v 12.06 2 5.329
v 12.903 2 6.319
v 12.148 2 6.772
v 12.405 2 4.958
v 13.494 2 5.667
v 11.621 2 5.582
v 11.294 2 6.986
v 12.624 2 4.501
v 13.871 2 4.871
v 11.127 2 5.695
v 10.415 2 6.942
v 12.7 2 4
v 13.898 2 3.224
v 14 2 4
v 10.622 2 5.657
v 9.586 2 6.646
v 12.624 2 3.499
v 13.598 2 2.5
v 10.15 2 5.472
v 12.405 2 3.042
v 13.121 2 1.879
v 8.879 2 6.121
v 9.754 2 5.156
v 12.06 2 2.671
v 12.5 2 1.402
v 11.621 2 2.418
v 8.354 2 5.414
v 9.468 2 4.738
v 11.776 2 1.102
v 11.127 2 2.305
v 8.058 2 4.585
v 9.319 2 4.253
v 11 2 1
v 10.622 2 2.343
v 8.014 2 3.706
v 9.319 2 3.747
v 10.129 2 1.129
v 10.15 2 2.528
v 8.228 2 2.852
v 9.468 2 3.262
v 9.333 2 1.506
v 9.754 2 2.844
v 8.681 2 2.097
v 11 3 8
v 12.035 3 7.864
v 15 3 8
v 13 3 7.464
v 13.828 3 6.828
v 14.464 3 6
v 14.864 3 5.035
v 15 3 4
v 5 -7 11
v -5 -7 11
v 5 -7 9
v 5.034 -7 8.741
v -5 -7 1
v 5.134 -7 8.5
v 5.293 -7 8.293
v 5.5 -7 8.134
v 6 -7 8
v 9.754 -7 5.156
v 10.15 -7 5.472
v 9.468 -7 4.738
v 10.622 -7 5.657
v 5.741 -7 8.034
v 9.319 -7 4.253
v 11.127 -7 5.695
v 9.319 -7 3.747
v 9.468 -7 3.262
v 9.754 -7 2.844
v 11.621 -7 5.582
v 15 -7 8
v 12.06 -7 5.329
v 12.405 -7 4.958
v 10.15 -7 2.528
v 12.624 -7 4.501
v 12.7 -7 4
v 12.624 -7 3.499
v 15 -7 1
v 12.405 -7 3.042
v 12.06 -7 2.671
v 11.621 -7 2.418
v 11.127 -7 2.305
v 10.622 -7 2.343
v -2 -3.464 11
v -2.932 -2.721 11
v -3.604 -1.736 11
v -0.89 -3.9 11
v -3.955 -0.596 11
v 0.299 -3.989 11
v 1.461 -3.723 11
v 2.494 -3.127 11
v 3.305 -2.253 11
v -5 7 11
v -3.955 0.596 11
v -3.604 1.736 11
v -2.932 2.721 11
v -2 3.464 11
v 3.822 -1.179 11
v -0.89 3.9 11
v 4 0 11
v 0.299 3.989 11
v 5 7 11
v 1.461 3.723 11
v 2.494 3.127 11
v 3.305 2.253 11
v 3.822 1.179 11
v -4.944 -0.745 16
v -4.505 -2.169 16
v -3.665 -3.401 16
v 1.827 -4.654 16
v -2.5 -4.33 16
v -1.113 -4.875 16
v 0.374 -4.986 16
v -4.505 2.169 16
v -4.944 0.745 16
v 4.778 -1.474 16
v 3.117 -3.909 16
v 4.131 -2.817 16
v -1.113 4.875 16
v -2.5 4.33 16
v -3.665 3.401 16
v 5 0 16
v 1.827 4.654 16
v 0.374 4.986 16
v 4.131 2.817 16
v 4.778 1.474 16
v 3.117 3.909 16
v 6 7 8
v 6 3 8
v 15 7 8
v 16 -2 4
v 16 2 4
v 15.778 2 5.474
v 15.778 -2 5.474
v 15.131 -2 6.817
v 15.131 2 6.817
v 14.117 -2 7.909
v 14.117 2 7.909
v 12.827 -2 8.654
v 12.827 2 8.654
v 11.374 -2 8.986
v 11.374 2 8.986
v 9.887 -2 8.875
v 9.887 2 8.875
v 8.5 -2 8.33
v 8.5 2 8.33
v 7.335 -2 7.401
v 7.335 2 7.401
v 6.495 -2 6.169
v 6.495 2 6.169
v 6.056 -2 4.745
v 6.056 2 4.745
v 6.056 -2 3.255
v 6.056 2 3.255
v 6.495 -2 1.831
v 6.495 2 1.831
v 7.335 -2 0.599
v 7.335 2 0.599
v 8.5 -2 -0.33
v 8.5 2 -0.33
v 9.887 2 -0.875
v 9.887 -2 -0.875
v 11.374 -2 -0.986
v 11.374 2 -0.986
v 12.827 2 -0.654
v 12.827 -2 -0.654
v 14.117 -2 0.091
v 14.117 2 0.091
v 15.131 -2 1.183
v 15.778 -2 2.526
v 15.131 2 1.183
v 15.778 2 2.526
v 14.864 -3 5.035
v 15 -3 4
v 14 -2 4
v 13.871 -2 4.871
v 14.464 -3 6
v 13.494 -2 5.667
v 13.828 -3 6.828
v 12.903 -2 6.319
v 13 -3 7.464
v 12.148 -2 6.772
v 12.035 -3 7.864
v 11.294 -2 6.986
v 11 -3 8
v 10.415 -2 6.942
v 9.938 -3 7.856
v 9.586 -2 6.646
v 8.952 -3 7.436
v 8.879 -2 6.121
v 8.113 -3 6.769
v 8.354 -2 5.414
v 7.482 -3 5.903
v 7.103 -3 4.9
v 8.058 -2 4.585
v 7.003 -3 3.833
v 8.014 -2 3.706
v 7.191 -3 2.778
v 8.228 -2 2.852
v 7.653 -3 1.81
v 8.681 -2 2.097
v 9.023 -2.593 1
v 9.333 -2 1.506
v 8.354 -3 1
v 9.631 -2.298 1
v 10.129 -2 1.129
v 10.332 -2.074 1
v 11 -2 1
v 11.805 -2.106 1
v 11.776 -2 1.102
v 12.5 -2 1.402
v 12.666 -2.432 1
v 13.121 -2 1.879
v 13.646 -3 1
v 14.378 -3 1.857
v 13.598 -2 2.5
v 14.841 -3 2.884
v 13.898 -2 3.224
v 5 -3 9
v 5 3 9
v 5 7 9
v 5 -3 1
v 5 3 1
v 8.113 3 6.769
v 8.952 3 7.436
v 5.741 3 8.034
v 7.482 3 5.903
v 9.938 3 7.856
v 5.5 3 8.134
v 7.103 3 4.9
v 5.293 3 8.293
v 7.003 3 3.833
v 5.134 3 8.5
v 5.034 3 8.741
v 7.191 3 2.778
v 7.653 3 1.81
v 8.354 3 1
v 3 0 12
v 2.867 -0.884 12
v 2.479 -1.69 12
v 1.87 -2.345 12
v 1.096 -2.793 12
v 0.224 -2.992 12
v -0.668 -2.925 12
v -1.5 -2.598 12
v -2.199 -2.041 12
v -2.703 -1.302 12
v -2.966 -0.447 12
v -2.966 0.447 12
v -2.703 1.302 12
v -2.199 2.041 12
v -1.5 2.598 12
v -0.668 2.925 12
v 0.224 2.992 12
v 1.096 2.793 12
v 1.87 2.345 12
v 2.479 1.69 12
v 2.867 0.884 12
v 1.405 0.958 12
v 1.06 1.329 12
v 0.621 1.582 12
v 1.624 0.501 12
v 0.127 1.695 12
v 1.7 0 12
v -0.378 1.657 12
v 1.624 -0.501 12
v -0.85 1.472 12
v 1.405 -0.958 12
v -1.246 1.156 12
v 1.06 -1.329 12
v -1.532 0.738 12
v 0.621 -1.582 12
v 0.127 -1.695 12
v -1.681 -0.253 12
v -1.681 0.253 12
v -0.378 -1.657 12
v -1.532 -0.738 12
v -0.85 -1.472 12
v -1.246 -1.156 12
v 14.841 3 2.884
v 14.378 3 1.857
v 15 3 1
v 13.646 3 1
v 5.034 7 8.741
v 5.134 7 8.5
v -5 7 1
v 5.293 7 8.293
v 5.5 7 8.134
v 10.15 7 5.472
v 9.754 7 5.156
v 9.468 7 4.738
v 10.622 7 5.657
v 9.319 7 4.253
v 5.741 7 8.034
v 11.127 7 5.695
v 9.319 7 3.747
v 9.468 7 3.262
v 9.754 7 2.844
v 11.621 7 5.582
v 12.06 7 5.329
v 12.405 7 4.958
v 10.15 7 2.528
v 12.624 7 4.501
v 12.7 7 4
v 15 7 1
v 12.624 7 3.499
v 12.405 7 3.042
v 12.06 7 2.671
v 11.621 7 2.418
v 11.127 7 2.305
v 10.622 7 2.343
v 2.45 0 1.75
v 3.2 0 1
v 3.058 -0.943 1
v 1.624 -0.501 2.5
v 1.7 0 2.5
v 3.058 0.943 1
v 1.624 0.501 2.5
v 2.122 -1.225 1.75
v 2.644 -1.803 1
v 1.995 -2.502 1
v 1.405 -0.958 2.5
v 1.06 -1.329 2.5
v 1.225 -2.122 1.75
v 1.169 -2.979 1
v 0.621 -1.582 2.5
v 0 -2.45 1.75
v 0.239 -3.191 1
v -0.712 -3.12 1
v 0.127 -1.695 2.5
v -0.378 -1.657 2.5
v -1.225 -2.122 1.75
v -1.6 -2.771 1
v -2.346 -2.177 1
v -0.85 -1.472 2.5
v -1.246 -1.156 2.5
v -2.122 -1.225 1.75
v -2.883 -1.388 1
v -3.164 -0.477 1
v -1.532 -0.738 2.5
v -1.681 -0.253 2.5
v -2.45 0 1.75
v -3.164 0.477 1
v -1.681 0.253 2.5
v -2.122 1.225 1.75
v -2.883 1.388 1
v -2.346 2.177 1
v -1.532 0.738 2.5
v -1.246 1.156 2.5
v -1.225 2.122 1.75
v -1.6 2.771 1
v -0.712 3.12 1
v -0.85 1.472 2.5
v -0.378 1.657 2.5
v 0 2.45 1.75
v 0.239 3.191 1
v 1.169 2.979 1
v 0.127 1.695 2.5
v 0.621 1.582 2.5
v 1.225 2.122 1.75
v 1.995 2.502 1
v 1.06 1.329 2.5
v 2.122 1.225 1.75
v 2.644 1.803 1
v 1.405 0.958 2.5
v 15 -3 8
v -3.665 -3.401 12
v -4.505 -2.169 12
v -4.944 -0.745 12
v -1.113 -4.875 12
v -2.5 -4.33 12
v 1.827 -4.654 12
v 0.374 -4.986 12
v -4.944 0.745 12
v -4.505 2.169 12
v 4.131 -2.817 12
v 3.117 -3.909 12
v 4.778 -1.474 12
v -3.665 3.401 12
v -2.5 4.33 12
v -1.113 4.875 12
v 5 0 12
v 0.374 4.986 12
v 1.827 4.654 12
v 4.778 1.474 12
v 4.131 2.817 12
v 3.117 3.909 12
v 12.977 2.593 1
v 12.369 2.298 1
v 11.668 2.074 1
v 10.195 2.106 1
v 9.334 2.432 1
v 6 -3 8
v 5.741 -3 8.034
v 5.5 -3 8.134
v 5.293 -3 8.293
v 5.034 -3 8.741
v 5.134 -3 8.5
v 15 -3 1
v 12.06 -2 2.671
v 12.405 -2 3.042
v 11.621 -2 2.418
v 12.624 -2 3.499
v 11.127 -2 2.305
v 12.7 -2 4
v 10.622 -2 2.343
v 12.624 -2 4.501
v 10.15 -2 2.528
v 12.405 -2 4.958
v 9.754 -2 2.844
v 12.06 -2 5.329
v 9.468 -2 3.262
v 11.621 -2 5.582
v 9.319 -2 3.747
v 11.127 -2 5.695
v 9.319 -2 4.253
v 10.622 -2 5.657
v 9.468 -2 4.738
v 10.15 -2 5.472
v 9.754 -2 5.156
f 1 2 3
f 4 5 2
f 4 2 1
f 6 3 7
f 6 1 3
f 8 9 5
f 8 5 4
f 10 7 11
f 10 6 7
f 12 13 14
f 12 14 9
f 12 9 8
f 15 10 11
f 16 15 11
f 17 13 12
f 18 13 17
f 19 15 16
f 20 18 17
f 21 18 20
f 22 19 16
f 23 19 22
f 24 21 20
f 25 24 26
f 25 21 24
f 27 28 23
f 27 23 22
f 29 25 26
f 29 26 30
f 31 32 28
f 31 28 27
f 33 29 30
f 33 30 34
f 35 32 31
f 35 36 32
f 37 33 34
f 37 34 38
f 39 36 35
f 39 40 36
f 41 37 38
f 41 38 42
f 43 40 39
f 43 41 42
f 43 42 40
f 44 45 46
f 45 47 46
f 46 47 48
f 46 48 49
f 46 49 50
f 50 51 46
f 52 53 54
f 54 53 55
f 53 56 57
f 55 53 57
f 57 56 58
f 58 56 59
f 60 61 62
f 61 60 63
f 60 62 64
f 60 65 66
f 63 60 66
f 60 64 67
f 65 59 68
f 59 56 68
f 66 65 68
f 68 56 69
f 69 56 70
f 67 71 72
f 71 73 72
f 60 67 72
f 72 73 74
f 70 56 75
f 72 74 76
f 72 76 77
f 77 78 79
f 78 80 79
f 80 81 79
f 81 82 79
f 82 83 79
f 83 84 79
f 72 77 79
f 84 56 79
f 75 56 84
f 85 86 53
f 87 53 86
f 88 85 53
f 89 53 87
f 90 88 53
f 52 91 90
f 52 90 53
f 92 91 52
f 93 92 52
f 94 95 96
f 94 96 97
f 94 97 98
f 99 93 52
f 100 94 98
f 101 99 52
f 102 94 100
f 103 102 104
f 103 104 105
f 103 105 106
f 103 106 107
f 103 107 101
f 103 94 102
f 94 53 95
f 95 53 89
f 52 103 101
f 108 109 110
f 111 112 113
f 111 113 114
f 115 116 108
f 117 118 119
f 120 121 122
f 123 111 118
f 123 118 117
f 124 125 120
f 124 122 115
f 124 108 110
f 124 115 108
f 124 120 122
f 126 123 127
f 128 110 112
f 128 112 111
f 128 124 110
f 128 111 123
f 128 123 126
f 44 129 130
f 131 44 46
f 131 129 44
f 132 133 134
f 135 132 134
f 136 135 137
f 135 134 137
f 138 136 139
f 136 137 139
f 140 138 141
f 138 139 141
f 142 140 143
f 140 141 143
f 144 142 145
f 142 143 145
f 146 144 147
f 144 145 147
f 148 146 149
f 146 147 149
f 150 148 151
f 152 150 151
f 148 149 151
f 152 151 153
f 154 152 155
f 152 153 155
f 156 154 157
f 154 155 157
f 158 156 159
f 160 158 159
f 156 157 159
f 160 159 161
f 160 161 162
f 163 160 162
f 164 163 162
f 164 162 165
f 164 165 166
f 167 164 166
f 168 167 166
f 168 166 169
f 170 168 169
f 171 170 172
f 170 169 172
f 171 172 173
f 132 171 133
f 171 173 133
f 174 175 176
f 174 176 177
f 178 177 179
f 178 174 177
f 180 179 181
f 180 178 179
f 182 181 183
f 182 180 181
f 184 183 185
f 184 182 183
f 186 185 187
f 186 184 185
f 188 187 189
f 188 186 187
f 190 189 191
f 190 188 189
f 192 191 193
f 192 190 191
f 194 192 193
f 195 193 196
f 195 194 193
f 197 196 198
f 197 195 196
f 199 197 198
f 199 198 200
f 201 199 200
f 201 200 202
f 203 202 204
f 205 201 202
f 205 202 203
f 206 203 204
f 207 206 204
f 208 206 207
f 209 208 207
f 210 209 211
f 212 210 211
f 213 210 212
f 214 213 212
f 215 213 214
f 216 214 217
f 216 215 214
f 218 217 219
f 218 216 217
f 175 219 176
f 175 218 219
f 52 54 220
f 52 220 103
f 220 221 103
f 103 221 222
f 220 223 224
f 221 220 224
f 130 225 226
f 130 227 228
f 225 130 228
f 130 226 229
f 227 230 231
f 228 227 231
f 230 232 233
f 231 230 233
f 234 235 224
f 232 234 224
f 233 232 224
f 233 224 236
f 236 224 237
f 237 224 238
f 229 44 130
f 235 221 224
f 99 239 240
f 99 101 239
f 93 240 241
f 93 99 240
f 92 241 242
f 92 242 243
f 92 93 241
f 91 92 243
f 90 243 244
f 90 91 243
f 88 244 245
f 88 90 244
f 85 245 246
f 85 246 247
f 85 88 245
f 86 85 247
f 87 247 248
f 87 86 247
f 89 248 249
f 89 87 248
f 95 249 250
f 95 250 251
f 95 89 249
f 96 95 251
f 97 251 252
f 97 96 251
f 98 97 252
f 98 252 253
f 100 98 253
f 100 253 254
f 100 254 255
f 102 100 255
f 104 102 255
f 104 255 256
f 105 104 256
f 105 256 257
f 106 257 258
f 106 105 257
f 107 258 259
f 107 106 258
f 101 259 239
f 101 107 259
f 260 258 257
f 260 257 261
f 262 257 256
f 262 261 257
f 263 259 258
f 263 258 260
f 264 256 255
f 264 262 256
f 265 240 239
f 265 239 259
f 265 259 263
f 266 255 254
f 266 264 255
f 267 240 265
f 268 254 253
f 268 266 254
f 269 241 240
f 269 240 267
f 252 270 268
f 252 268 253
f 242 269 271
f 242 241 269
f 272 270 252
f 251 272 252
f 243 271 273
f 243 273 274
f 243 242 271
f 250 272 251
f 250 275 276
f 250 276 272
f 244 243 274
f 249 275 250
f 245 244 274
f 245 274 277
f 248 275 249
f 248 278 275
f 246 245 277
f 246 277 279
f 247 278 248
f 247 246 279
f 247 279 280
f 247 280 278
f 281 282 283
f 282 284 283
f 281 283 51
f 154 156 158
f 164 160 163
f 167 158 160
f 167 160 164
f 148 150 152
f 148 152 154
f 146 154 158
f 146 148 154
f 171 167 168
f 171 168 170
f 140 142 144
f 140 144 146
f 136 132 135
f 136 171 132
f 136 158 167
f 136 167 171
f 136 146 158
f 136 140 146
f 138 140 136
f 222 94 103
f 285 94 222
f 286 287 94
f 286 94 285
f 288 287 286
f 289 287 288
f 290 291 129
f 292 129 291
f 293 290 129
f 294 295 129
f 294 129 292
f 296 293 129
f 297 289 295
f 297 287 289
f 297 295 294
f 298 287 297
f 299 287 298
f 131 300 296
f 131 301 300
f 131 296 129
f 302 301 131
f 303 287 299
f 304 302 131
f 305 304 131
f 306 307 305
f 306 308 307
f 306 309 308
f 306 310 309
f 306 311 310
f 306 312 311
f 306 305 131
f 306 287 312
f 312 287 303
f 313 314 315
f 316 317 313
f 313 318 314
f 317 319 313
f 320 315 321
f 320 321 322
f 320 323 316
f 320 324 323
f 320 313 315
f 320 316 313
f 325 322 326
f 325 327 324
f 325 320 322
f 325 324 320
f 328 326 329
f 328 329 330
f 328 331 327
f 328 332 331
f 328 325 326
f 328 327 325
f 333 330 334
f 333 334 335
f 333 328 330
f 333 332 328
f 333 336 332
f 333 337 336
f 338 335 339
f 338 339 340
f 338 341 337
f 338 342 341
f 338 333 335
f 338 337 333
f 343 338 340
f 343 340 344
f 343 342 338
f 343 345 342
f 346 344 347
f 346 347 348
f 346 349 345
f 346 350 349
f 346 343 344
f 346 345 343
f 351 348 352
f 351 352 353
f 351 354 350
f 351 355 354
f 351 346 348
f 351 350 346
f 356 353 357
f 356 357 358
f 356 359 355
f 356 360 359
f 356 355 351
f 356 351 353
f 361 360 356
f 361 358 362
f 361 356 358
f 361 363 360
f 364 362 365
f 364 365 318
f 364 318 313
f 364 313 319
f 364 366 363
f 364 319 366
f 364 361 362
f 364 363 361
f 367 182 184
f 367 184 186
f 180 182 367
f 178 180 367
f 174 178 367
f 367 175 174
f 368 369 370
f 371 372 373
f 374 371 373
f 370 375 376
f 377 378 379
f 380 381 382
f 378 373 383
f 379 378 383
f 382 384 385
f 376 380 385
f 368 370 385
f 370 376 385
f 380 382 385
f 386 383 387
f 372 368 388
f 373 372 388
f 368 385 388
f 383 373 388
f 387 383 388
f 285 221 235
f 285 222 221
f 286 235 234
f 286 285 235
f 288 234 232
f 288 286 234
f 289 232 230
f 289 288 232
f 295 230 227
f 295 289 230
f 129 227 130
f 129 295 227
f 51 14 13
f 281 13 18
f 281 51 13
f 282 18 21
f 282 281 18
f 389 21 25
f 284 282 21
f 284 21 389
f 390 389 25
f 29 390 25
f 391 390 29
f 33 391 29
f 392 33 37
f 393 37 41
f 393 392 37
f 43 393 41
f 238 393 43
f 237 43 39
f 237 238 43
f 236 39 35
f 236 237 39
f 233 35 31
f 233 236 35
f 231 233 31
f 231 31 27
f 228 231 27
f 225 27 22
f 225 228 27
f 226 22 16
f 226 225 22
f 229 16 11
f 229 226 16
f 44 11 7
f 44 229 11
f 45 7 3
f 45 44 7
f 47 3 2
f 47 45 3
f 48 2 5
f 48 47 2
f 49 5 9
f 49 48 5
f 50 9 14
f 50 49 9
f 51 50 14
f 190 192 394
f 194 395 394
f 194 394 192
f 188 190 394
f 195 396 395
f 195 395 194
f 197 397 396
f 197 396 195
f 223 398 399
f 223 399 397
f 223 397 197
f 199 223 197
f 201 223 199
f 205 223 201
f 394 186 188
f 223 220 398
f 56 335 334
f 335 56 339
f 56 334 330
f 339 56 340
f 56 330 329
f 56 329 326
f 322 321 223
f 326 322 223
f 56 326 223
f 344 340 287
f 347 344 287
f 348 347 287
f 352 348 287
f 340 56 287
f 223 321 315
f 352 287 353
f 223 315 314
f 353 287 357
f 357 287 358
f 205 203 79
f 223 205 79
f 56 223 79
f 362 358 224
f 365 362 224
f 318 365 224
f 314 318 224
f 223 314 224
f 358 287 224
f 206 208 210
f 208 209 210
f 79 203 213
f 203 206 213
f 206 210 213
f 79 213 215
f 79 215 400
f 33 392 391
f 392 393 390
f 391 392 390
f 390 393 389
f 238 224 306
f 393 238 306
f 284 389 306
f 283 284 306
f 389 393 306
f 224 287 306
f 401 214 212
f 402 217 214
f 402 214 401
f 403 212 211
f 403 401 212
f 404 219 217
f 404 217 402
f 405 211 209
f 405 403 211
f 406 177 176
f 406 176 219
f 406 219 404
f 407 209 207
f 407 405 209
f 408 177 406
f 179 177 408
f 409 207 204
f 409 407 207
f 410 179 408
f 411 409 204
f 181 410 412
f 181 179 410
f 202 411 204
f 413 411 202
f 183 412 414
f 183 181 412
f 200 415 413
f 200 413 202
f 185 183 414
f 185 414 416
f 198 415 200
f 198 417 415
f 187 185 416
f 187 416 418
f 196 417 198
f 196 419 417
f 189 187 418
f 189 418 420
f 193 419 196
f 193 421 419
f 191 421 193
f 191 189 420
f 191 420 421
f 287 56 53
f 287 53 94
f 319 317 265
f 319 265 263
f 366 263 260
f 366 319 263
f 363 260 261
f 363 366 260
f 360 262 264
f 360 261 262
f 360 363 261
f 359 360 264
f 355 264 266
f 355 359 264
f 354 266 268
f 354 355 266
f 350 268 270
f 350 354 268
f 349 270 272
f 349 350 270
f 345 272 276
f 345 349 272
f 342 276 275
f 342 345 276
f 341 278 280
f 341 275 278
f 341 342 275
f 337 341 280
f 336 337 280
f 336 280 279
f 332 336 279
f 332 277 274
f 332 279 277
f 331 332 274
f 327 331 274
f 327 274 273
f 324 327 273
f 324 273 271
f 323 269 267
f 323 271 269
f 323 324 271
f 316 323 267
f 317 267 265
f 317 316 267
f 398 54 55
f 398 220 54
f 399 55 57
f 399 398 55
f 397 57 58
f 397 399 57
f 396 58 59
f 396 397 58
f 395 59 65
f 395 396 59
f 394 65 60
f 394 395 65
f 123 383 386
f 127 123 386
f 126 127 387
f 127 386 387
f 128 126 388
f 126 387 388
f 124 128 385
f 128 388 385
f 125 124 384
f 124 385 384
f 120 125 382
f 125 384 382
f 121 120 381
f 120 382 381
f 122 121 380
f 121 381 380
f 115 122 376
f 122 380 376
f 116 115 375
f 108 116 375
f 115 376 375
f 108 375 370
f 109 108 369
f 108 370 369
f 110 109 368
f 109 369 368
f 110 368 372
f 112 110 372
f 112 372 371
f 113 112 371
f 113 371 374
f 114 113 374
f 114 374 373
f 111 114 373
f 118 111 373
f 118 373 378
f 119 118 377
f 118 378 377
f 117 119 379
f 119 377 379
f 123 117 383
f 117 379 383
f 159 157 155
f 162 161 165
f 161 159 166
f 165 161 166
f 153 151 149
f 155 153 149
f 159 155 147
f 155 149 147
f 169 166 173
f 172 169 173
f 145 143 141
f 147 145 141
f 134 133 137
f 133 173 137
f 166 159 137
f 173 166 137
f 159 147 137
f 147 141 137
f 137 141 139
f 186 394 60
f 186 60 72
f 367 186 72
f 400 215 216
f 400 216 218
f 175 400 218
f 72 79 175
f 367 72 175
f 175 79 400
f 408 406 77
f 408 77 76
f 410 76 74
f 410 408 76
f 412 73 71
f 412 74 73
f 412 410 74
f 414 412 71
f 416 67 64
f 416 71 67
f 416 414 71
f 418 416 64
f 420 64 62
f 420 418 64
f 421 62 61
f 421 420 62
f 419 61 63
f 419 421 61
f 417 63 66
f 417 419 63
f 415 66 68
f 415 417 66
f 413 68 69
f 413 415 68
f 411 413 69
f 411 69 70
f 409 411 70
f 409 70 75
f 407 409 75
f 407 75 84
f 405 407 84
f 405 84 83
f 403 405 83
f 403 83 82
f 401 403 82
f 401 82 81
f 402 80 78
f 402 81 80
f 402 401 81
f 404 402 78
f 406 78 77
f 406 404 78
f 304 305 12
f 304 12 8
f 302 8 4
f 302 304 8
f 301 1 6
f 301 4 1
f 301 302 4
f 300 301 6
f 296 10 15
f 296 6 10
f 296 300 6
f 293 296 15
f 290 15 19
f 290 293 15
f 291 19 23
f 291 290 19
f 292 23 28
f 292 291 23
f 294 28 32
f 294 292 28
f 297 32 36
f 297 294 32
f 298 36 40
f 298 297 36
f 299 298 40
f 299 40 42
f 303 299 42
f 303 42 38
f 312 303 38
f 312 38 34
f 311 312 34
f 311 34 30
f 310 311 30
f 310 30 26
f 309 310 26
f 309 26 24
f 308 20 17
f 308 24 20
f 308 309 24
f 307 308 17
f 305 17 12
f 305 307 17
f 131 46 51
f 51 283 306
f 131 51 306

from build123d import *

# Parameters (mm, degrees)
CYLINDER082_R     = 5
CYLINDER082_DEPTH = 4
CYLINDER083_R     = 5
CYLINDER083_DEPTH = 4
CYLINDER084_R     = 1.7
CYLINDER084_DEPTH = 18
BOX002_W          = 11
BOX002_H          = 6
BOX002_DEPTH      = 10
BOX001_W          = 10
BOX001_H          = 14
BOX001_DEPTH      = 7
BOX003_W          = 10
BOX003_H          = 10
BOX003_DEPTH      = 10
CYLINDER_R        = 1.7
CYLINDER_DEPTH    = 14
BOX_W             = 10
BOX_H             = 14
BOX_DEPTH         = 10
CHAMFER_SIZE      = 1.5
FILLET_R          = 1


with BuildPart() as f_623_bearing:
    # Cylinder082 → Cylinder082 (new body)
    with BuildSketch(Plane.XY.offset(12)):
        Circle(CYLINDER082_R)
    extrude(amount=CYLINDER082_DEPTH)


with BuildPart() as f_623_bearing001:
    # Cylinder083 → Cylinder083 (new body)
    with BuildSketch(Plane(origin=(11, 2, 4), x_dir=(1, 0, 0), z_dir=(0, -1, 0))):
        Circle(CYLINDER083_R)
    extrude(amount=CYLINDER083_DEPTH)


with BuildPart() as screw:
    # Cylinder084 → Cylinder084 (new body)
    with BuildSketch(Plane(origin=(11, 8, 4), x_dir=(1, 0, 0), z_dir=(0, -1, 0))):
        Circle(CYLINDER084_R)
    extrude(amount=CYLINDER084_DEPTH)


with BuildPart() as cube002:
    # Box002 → Box002 (new body)
    with BuildSketch(Plane(origin=(5, -3, 0), x_dir=(1, 0, 0), z_dir=(0, 0, 1))):
        with Locations((5.5, 3)):
            Rectangle(BOX002_W, BOX002_H)
    extrude(amount=BOX002_DEPTH)


with BuildPart() as cut:
    # Box001 → Box001 (new body)
    with BuildSketch(Plane(origin=(5, -7, 1), x_dir=(1, 0, 0), z_dir=(0, 0, 1))):
        with Locations((5, 7)):
            Rectangle(BOX001_W, BOX001_H)
    extrude(amount=BOX001_DEPTH)

    # Cut: cut Cube002
    add(cube002.part, mode=Mode.SUBTRACT)


with BuildPart() as cube003:
    # Box003 → Box003 (new body)
    with BuildSketch(Plane(origin=(5, -5, -9), x_dir=(1, 0, 0), z_dir=(0, 0, 1))):
        with Locations((5, 5)):
            Rectangle(BOX003_W, BOX003_H)
    extrude(amount=BOX003_DEPTH)


with BuildPart() as cone002:
    # Cone002 → Cone002 (revolve)
    with BuildSketch(Plane(origin=(11, 2, 4), x_dir=(1, 0, 0), z_dir=(0, 0, 1))):
        Polygon((0, 0), (3, 0), (4, 1), (0, 1), align=None)
    revolve(axis=Axis((11, 2, 4), (0, 1, 0)))


with BuildPart() as cut002:
    # Cone001 → Cone001 (revolve)
    with BuildSketch(Plane(origin=(11, -2, 4), x_dir=(1, 0, 0), z_dir=(0, 0, -1))):
        Polygon((0, 0), (3, 0), (4, 1), (0, 1), align=None)
    revolve(axis=Axis((11, -2, 4), (0, -1, 0)))

    # Fusion: union Cone002
    add(cone002.part)

    # Cut001: cut Cube003
    add(cube003.part, mode=Mode.SUBTRACT)

    # Fusion001: union Cut
    add(cut.part)

    # Cut002: cut screw
    add(screw.part, mode=Mode.SUBTRACT)


with BuildPart() as cylinder:
    # Cylinder → Cylinder (new body)
    with BuildSketch(Plane.XY):
        Circle(CYLINDER_R)
    extrude(amount=CYLINDER_DEPTH)


with BuildPart() as cone:
    # Cone → Cone (revolve)
    with BuildSketch(Plane(origin=(0, 0, 12), x_dir=(1, 0, 0), z_dir=(0, 1, 0))):
        Polygon((0, 0), (3, 0), (4, 1), (0, 1), align=None)
    revolve(axis=Axis((0, 0, 12), (0, 0, -1)))


with BuildPart() as fillet_body:
    # Box → Box (new body)
    with BuildSketch(Plane(origin=(-5, -7, 1), x_dir=(1, 0, 0), z_dir=(0, 0, 1))):
        with Locations((5, 7)):
            Rectangle(BOX_W, BOX_H)
    extrude(amount=BOX_DEPTH)

    # Fusion002: union Cone
    add(cone.part)

    # Cut003: cut Cylinder
    add(cylinder.part, mode=Mode.SUBTRACT)

    # Fusion003: union Cut002
    add(cut002.part)

    # Chamfer
    chamfer_edges = [fillet_body.edges().sort_by_distance(p)[0] for p in [
        (-1.7, 0, 1),
    ]]
    chamfer(chamfer_edges, length=CHAMFER_SIZE)

    # Fillet
    fillet_edges = [fillet_body.edges().sort_by_distance(p)[0] for p in [
        (5, 5, 8),
        (5, -5, 8),
    ]]
    fillet(fillet_edges, radius=FILLET_R)


solid = Compound([f_623_bearing.part, f_623_bearing001.part, fillet_body.part])
